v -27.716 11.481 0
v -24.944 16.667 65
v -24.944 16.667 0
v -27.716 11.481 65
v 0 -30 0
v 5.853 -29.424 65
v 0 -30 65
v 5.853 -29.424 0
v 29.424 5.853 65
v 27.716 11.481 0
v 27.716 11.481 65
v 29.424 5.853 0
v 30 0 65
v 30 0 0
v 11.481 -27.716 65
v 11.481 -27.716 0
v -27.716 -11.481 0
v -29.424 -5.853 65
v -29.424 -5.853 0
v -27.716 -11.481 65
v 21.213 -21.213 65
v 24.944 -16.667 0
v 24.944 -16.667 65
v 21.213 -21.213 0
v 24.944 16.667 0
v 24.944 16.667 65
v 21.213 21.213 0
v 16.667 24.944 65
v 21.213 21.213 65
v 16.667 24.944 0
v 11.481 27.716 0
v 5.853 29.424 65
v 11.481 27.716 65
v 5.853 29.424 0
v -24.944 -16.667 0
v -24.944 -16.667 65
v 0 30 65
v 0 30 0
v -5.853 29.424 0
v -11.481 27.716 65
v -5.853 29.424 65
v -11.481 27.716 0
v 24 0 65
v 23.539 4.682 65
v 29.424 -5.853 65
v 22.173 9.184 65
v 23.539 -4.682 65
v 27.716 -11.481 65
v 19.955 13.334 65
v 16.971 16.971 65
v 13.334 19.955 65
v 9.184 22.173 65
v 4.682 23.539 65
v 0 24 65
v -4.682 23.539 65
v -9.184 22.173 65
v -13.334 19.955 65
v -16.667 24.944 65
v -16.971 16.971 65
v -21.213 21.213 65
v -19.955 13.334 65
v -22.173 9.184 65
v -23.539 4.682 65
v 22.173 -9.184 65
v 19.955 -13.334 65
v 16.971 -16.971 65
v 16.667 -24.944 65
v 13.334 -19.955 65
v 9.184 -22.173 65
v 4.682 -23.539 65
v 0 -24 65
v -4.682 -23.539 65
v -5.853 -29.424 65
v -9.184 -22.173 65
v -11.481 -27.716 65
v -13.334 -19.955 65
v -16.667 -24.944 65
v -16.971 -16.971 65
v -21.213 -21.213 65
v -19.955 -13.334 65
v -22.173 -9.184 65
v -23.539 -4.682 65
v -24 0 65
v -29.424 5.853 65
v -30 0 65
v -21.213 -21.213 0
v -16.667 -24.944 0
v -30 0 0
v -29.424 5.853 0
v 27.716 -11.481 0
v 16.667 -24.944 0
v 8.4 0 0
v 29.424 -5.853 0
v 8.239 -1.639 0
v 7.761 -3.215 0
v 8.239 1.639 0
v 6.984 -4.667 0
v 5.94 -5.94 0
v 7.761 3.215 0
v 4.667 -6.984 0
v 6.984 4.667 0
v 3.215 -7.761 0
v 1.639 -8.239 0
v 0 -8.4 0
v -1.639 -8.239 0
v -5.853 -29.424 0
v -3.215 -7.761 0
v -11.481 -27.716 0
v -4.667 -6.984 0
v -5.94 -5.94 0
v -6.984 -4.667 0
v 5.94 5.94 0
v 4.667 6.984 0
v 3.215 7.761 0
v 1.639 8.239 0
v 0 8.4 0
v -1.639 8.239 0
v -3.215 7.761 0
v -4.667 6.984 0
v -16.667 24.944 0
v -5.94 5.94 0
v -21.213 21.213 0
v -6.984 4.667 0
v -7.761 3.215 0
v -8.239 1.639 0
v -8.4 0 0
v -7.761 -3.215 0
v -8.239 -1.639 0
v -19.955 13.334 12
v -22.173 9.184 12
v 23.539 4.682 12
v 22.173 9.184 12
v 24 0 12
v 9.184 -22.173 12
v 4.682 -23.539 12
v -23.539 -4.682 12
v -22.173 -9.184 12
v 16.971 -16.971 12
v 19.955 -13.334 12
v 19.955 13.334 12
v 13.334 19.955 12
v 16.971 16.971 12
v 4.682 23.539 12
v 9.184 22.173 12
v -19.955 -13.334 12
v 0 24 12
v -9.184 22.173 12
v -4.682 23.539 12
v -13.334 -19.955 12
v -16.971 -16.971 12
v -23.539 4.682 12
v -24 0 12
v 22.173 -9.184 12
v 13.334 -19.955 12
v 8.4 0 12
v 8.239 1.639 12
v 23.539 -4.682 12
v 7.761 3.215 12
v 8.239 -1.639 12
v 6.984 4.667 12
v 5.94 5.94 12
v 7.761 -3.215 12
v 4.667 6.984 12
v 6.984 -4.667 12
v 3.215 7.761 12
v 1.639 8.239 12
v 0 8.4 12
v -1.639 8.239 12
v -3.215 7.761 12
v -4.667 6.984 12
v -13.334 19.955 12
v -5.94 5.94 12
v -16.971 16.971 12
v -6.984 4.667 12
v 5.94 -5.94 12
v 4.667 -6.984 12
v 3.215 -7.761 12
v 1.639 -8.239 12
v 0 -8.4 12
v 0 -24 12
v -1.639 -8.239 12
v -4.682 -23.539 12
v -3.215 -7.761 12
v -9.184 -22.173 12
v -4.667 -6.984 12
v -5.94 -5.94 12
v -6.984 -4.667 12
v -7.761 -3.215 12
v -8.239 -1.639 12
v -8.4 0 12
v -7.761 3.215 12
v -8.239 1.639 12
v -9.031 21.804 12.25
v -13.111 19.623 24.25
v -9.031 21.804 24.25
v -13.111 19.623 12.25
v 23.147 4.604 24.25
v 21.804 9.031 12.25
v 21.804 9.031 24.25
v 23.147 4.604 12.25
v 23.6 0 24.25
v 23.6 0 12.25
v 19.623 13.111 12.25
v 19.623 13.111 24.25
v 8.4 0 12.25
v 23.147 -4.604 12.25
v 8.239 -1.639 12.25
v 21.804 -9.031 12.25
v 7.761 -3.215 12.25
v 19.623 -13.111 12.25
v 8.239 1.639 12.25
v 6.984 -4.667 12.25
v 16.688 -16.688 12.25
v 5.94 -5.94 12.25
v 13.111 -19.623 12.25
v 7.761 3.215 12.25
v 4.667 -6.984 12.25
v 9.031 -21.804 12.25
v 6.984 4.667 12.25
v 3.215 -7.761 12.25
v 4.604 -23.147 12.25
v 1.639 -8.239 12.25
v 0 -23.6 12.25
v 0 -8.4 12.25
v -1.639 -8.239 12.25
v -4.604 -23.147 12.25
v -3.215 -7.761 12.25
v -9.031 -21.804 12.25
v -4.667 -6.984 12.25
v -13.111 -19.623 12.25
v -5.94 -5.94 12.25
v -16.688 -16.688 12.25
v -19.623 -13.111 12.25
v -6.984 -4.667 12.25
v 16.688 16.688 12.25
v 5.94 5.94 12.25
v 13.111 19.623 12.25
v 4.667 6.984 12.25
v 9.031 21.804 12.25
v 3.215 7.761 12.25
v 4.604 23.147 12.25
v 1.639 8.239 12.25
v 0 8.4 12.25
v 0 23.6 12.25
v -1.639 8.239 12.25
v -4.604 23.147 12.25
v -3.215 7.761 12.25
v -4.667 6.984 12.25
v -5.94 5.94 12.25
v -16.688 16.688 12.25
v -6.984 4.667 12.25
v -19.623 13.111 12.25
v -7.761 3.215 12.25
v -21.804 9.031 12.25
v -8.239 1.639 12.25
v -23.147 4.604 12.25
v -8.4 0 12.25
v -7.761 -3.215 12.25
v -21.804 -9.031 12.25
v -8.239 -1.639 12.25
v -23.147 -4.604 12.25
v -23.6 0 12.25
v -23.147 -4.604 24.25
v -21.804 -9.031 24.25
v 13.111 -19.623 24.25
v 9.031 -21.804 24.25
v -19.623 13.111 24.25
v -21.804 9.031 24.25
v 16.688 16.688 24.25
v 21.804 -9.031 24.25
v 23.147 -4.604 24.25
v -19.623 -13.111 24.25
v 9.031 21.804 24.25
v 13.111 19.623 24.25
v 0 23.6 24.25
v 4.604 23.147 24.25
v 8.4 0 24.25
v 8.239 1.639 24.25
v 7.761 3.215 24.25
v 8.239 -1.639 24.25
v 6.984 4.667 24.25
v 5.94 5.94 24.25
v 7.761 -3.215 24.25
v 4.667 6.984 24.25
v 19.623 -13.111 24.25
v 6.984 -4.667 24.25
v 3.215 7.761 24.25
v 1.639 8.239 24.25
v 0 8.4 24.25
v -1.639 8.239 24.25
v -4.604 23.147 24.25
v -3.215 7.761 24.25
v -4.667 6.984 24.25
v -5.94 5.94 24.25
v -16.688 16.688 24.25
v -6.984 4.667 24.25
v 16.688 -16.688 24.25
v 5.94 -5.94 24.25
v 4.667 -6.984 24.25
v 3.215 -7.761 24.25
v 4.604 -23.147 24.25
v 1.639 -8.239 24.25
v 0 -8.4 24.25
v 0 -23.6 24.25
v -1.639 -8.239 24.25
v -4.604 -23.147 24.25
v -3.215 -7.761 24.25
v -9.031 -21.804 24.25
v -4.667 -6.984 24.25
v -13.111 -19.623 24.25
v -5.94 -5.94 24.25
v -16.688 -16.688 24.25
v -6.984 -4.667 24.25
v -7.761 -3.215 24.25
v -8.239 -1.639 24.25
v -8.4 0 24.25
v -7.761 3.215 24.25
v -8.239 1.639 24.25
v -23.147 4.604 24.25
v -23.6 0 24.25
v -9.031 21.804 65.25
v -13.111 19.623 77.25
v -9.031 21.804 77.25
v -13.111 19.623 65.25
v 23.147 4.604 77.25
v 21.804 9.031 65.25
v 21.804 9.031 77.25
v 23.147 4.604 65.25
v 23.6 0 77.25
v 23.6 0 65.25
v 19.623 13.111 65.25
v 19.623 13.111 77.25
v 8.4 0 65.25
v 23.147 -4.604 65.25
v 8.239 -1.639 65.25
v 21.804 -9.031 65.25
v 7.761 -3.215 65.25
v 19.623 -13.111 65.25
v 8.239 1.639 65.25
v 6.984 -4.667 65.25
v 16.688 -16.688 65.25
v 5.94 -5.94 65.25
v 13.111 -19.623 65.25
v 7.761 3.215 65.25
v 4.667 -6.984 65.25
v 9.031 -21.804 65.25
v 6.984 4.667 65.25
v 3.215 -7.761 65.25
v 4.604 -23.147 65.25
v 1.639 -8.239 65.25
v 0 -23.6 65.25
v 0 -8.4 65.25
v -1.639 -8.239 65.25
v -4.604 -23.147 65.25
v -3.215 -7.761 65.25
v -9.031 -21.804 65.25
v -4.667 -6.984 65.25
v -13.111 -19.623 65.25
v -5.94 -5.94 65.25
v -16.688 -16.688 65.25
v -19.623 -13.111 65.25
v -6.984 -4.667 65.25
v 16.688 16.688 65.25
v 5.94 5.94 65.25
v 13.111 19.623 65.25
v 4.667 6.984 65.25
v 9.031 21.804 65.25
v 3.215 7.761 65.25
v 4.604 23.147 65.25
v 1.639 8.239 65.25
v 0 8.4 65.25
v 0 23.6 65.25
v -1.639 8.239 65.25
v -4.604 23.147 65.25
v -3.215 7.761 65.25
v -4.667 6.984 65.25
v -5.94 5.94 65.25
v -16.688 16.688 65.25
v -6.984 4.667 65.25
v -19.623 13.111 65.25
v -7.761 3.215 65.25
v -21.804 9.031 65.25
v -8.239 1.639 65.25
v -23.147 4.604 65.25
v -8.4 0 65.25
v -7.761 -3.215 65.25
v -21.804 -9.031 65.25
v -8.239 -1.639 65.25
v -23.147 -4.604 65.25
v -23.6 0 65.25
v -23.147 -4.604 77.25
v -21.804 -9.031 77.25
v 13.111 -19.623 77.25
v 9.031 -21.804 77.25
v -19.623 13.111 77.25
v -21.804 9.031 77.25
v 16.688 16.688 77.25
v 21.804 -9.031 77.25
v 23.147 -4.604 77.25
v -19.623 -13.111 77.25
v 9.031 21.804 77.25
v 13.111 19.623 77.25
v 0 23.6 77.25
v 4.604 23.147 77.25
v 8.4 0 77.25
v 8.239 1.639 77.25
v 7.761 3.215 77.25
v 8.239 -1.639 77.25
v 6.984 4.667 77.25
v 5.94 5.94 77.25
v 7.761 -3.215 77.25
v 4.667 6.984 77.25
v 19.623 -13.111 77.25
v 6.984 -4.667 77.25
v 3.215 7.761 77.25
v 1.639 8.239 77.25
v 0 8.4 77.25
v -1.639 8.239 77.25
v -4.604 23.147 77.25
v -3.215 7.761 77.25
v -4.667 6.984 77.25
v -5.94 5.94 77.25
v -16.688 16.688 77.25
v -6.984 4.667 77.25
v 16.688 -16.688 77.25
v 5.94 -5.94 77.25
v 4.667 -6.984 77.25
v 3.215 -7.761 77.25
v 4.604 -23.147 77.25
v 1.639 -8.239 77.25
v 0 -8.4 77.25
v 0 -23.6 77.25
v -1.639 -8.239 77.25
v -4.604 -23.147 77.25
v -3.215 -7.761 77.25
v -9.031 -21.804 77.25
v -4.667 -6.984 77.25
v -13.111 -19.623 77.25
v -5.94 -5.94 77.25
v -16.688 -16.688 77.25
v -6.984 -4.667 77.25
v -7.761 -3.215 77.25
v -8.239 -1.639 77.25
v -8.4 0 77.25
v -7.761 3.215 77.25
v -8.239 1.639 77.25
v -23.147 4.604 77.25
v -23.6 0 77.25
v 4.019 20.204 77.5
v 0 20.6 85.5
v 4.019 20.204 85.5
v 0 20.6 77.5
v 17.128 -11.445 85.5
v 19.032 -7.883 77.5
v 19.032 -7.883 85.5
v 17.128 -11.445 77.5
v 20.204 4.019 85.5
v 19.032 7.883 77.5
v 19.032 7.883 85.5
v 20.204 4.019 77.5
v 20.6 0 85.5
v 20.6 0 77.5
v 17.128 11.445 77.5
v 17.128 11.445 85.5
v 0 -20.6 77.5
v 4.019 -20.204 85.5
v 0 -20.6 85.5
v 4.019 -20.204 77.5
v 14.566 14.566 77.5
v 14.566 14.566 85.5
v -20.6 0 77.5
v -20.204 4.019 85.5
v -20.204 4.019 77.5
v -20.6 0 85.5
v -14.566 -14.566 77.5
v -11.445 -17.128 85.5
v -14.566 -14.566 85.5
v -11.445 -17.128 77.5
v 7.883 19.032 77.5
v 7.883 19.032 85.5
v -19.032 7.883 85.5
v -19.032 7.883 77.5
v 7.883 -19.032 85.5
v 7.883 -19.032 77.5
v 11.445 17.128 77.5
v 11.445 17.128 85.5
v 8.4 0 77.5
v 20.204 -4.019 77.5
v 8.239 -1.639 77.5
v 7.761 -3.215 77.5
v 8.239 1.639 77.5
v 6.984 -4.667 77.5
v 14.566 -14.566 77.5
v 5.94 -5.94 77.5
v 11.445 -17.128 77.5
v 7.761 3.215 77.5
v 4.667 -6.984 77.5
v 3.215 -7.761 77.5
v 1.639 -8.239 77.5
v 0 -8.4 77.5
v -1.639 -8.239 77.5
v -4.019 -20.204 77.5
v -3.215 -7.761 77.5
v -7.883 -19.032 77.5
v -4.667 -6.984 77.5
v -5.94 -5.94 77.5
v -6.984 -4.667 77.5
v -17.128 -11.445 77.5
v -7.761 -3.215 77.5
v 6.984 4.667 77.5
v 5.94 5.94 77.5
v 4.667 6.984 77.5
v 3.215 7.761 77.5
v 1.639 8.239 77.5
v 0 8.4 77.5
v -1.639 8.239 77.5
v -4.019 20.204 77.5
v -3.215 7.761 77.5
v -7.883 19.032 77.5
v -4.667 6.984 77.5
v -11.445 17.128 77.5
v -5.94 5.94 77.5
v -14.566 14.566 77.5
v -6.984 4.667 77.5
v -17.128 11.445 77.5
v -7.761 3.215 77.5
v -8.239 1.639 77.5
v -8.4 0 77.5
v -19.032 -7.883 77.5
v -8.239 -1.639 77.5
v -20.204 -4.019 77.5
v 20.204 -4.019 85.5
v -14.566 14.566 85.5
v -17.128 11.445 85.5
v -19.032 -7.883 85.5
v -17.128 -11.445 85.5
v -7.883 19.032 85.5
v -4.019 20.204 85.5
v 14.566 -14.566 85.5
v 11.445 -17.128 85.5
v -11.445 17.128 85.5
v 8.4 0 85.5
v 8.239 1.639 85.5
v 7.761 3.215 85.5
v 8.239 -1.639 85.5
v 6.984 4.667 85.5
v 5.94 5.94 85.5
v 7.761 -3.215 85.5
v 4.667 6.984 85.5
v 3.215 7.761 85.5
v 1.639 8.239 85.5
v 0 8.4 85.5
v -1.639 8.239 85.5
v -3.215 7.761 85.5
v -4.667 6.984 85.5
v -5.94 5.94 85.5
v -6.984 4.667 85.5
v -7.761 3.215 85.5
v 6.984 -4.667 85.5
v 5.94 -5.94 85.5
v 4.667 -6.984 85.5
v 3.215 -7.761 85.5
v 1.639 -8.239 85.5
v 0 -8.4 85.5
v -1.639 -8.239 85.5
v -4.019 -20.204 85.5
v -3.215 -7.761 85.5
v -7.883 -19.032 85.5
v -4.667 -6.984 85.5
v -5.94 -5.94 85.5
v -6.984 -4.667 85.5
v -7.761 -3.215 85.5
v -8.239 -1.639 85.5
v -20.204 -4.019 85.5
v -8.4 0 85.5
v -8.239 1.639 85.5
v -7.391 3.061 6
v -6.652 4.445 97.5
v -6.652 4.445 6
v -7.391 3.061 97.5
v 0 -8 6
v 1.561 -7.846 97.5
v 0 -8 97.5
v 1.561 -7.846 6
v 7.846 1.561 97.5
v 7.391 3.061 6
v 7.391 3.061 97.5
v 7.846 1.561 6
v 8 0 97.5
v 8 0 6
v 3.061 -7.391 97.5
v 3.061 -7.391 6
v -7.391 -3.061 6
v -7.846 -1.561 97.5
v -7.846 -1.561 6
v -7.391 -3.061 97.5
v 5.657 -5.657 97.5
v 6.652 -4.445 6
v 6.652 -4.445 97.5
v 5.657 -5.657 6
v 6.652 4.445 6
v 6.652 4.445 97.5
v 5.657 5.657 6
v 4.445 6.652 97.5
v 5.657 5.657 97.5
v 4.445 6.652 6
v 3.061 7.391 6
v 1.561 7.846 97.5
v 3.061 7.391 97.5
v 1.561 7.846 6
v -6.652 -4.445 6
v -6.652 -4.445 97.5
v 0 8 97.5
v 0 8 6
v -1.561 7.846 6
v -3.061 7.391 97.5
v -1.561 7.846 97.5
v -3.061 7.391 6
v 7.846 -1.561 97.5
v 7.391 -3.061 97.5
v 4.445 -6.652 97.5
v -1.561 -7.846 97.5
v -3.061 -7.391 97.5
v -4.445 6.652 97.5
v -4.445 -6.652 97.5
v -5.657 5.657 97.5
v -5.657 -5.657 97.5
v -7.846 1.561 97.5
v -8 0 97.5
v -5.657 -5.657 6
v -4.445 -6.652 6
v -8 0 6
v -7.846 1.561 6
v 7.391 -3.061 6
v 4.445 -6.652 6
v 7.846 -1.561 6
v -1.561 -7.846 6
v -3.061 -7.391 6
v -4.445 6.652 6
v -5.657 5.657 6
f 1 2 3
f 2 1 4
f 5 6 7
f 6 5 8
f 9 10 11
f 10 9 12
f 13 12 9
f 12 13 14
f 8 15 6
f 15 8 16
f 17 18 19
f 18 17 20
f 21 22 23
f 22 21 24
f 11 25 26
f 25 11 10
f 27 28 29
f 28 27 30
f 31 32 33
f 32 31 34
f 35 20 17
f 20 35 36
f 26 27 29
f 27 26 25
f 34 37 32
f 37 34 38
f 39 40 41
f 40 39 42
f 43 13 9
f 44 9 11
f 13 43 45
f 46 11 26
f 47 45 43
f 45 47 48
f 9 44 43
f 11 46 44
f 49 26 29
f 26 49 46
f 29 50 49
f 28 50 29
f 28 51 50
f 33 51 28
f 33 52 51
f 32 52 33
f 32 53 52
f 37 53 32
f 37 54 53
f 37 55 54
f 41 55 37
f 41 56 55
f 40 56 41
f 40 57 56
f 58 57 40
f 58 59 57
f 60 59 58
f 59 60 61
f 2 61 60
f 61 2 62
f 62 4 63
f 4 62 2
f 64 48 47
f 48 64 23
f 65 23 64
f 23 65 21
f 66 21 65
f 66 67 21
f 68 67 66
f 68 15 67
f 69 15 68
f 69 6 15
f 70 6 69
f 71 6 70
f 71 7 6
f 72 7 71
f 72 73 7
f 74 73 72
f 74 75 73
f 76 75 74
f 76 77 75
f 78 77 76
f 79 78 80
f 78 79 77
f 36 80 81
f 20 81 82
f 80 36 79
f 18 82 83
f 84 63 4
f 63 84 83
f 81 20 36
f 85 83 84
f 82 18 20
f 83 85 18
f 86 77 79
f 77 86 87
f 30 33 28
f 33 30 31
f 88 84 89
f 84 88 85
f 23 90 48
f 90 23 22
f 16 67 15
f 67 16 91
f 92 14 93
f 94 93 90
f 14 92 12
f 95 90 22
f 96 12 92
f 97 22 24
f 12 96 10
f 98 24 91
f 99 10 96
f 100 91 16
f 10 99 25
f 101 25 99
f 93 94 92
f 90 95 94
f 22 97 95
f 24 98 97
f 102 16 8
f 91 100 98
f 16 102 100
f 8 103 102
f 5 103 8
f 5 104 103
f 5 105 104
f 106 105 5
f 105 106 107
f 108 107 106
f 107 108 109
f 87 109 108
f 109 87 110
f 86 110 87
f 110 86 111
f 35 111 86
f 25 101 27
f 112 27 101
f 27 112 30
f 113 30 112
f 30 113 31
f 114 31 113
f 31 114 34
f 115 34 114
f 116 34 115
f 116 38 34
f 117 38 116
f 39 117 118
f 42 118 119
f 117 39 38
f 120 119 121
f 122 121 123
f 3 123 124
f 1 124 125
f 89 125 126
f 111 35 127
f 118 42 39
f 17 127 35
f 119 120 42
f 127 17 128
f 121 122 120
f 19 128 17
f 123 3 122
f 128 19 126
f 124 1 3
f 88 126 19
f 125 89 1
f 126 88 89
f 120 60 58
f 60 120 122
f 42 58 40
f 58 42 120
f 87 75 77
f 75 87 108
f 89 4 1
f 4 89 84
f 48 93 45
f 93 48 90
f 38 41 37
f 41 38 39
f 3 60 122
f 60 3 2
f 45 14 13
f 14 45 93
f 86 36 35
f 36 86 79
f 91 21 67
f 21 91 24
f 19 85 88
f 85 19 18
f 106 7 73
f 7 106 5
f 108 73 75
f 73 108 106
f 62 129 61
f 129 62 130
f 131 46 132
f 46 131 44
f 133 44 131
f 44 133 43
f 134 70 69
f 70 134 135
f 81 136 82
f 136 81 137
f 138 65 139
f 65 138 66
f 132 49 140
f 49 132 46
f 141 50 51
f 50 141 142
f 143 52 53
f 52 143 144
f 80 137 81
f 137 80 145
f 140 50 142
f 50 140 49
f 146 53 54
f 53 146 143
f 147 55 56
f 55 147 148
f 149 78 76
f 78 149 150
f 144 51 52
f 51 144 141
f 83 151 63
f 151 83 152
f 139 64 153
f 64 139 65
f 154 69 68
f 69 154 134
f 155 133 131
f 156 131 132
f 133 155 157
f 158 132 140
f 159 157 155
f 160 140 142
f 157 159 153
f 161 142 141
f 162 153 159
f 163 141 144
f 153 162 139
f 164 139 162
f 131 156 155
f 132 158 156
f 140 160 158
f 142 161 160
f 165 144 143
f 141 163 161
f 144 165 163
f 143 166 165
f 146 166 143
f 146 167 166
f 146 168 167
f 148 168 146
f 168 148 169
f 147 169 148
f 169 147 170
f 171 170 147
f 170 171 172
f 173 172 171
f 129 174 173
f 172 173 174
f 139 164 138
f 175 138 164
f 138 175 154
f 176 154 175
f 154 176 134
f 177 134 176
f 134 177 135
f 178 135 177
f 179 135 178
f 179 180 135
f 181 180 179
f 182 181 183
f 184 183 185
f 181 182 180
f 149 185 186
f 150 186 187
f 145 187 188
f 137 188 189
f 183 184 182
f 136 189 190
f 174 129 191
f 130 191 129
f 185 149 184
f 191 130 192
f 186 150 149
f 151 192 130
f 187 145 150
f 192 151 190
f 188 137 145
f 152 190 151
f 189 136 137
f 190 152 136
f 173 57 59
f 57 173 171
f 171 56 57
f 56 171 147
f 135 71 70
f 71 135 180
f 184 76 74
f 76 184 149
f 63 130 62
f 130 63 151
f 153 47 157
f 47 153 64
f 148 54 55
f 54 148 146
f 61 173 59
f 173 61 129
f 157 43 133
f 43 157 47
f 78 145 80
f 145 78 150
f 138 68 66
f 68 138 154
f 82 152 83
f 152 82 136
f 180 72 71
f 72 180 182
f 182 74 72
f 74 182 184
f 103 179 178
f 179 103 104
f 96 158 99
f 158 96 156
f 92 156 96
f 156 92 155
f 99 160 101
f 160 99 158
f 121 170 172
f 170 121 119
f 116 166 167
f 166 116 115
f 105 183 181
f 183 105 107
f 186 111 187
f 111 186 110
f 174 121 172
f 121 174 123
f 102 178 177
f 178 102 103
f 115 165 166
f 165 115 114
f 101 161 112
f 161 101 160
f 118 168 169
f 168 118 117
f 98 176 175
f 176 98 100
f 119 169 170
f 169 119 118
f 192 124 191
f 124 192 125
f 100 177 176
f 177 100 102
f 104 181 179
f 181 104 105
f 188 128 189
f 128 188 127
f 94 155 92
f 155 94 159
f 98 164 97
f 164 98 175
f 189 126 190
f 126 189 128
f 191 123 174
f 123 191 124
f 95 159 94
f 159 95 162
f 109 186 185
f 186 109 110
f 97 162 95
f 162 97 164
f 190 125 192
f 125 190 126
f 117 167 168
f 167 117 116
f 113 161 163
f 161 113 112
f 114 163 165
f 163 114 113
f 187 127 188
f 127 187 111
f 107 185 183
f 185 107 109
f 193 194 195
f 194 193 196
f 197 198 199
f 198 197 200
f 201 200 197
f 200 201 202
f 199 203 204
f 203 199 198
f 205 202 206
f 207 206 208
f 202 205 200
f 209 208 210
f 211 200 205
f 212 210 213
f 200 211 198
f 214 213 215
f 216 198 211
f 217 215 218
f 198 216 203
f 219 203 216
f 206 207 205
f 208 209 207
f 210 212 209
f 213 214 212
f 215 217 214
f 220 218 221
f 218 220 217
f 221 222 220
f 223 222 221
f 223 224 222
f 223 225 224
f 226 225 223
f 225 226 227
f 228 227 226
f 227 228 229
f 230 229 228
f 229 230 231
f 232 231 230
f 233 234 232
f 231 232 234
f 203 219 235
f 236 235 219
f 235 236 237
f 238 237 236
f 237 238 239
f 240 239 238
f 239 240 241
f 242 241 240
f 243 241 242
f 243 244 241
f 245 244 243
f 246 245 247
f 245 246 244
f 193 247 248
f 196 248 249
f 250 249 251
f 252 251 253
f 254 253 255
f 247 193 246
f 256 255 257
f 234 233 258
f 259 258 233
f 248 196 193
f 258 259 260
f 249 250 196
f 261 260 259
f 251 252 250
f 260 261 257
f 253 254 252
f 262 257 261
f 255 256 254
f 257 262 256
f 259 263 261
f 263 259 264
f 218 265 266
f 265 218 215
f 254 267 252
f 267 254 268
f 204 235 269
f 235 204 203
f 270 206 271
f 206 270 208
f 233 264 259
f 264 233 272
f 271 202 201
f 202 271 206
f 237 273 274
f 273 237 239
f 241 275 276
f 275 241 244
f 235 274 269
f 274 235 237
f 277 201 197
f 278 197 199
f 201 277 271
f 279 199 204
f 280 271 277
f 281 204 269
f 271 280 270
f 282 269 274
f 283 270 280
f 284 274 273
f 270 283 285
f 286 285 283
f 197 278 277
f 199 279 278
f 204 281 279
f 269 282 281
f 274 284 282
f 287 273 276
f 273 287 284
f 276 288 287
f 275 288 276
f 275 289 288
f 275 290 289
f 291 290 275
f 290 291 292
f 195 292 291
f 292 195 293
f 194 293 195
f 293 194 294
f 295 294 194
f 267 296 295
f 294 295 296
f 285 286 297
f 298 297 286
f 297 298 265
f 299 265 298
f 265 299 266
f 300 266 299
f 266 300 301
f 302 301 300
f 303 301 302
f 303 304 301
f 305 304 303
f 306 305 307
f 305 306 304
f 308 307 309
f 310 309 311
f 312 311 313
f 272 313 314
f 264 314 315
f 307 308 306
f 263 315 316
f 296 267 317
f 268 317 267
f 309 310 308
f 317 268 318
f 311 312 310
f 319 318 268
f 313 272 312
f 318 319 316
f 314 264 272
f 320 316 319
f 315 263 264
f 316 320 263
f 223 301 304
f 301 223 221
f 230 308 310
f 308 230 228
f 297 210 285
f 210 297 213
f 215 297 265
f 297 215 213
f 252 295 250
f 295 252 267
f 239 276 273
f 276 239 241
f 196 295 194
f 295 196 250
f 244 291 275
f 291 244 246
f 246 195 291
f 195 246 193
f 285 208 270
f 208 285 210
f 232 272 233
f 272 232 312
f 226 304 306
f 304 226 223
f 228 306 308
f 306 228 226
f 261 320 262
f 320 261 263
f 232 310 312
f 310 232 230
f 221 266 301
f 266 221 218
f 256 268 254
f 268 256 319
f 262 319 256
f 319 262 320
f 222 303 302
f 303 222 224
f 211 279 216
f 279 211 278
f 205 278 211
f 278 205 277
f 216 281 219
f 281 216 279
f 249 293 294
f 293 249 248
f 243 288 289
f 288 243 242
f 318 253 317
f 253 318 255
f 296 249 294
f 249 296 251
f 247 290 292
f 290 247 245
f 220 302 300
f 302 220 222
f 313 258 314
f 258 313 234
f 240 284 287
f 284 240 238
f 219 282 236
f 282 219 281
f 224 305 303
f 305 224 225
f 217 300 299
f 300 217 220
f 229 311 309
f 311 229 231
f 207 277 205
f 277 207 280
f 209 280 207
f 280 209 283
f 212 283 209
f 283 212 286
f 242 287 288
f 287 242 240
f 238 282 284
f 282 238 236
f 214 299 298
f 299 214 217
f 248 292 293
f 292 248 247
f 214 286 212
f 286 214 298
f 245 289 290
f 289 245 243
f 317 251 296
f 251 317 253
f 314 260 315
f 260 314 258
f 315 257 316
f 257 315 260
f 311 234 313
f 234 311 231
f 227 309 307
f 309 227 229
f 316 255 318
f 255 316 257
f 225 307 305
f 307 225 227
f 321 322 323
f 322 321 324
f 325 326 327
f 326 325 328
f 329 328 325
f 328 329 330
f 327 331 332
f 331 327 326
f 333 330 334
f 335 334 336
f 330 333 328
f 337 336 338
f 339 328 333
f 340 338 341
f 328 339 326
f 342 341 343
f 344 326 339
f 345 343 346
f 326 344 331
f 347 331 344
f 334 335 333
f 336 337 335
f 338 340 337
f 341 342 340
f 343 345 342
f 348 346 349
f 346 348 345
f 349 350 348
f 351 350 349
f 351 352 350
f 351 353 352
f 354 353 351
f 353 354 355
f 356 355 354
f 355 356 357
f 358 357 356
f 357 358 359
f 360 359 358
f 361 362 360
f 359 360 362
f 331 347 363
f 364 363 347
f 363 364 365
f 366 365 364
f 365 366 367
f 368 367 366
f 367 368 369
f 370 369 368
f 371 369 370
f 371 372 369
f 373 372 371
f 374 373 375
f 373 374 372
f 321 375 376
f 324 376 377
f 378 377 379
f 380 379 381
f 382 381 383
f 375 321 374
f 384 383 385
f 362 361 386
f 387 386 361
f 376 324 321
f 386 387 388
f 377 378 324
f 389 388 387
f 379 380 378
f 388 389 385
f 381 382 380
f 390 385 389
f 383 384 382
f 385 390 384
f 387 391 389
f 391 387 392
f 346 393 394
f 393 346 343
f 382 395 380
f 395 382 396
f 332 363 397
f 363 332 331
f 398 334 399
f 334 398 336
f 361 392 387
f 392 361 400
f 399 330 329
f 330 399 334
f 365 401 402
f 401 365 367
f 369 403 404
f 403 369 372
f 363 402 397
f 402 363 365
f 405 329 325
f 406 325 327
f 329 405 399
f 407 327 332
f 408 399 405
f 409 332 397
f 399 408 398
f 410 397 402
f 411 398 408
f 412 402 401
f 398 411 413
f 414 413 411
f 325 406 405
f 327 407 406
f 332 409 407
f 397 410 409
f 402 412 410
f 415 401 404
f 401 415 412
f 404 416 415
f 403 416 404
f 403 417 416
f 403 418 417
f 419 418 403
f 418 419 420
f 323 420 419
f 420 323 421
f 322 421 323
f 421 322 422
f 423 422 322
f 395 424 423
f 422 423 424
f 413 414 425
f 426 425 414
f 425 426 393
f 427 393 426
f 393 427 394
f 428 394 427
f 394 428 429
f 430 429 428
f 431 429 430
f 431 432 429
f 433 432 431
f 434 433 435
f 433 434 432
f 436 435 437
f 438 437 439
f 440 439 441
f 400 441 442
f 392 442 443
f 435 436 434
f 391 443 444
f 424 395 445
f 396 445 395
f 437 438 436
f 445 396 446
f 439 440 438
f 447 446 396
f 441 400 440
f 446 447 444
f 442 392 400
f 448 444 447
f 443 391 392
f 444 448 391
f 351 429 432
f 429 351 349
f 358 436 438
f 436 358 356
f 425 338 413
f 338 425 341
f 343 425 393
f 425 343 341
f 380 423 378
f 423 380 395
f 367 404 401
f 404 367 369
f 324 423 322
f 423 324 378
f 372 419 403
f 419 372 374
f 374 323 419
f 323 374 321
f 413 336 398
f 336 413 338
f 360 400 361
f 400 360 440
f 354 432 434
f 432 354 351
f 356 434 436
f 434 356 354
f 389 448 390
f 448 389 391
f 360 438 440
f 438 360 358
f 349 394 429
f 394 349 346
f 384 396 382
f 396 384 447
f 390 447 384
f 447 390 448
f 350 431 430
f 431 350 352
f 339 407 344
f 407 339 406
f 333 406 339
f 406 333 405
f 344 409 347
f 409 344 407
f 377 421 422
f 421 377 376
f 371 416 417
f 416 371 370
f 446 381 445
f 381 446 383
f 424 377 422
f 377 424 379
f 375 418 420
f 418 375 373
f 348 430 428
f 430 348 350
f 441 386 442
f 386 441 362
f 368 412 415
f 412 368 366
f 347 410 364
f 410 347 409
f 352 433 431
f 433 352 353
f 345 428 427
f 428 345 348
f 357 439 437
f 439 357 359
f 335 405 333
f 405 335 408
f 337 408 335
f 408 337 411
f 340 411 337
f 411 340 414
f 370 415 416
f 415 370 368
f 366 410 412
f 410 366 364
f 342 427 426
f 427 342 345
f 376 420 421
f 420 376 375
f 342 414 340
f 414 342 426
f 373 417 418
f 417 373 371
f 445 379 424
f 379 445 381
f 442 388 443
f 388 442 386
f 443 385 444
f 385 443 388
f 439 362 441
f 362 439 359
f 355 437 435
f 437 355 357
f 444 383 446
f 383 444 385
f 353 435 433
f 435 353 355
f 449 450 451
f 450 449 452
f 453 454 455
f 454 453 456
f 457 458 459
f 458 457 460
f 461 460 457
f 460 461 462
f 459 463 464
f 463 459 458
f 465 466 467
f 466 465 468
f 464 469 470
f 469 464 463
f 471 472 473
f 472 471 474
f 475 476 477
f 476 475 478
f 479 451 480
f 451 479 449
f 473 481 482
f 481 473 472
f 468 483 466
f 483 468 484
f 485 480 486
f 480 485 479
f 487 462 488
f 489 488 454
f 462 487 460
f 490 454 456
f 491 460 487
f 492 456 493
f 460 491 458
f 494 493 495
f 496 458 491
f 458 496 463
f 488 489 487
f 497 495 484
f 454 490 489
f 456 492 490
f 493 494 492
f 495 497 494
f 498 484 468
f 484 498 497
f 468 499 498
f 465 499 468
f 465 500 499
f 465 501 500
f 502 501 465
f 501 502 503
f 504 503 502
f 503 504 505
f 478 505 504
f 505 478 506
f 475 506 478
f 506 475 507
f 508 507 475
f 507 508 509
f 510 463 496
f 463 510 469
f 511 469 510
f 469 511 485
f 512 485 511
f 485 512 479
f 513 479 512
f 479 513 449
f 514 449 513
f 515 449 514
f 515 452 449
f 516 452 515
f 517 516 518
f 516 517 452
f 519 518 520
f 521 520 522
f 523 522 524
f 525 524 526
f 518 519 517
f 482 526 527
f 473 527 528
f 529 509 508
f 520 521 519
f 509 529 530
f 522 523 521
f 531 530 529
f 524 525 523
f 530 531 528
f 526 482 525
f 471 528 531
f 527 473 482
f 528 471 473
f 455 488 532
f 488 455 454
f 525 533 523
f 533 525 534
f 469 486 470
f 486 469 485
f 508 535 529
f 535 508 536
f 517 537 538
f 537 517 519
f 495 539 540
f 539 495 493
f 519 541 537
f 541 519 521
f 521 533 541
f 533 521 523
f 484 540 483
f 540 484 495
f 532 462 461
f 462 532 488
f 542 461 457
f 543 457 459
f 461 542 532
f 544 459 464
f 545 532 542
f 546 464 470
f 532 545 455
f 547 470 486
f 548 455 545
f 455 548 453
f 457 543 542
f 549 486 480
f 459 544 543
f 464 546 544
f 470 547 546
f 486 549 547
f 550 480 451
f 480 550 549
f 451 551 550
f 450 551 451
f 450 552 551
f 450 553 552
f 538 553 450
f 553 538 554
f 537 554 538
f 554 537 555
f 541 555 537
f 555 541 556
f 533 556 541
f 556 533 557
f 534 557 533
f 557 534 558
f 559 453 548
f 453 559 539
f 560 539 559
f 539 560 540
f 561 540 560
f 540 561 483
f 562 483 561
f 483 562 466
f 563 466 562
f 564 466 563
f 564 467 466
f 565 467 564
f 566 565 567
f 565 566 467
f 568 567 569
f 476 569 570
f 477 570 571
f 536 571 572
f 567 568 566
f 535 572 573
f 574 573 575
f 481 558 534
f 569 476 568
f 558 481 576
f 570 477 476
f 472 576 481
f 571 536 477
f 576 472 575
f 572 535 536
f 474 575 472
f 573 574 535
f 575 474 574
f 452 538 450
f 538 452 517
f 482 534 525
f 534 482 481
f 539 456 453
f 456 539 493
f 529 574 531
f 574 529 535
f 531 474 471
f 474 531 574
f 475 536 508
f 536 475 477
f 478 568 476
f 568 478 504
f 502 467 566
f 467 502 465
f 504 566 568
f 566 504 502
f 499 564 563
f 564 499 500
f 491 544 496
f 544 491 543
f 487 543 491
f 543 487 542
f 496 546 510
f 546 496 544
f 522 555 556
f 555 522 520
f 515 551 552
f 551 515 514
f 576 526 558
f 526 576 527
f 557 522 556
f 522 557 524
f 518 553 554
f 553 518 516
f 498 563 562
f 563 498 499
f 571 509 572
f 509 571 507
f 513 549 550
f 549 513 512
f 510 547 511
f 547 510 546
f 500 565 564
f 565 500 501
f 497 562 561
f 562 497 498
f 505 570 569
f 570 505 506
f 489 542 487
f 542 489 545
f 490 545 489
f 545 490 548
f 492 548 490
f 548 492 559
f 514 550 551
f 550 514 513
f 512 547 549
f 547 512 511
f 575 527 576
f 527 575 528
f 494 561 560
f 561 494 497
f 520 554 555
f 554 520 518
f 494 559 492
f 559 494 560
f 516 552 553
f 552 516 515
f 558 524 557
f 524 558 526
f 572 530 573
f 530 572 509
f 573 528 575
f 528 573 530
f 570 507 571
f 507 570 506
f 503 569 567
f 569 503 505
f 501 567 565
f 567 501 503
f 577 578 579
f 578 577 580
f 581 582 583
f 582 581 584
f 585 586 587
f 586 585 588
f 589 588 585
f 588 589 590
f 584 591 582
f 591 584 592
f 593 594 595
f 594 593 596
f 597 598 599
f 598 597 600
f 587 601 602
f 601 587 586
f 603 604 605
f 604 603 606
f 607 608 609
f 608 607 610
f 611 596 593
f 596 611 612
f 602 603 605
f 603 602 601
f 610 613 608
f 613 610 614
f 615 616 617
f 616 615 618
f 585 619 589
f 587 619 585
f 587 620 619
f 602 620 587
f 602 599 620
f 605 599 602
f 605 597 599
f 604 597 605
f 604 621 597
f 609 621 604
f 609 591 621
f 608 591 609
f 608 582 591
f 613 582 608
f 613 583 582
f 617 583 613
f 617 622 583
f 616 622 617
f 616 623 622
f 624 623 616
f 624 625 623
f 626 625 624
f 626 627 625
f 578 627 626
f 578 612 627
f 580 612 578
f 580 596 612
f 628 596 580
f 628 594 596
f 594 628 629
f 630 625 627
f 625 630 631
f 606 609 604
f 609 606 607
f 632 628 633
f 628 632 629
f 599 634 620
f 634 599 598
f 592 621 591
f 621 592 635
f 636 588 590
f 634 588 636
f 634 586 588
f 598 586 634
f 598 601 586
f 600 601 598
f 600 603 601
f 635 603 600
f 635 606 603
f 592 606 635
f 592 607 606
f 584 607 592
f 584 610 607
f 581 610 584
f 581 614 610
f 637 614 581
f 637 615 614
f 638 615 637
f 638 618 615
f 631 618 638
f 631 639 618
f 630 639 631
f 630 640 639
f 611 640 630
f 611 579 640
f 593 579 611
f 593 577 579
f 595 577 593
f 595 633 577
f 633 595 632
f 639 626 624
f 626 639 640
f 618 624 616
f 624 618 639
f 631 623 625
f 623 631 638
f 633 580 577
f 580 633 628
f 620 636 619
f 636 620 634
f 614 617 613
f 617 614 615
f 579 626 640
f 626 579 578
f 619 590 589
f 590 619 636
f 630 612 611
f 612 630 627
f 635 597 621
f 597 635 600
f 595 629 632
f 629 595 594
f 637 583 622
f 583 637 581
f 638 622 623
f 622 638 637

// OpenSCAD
$fn = 32;

// ------------------------------------------------------------------------
// Bearing housing: housing d60, two bearings and a shaft
// Every part is its own module, assembly() places them once.
// ------------------------------------------------------------------------

// --- part 1 ---
module housing() {
  difference() {
    cylinder(h = 65, d = 60);
    translate([0, 0, 12]) cylinder(h = 54, d = 48);
    translate([0, 0, -1]) cylinder(h = 14, d = 16.8);
  }
}

// --- part 2 ---
module bearing_lower() {
  difference() {
      translate([0, 0, 0]) cylinder(h = 12, d = 47.2);
      translate([0, 0, -1]) cylinder(h = 14, d = 16.8);
    }
}

// --- part 3 ---
module bearing_upper() {
  difference() {
      translate([0, 0, 0]) cylinder(h = 12, d = 47.2);
      translate([0, 0, -1]) cylinder(h = 14, d = 16.8);
    }
}

// --- part 4 ---
module spacer() {
  difference() {
      translate([0, 0, 0]) cylinder(h = 8, d = 41.2);
      translate([0, 0, -1]) cylinder(h = 10, d = 16.8);
    }
}

// --- part 5 ---
module shaft() {
  translate([0, 0, -45.75]) cylinder(h = 91.5, d = 16);
}

// --- assembly ---
module assembly() {
  translate([0, 0, 0]) rotate([0, 0, 0]) housing();
  translate([0, 0, 12.25]) rotate([0, 0, 0]) bearing_lower();
  translate([0, 0, 65.25]) rotate([0, 0, 0]) bearing_upper();
  translate([0, 0, 77.5]) rotate([0, 0, 0]) spacer();
  translate([0, 0, 51.75]) rotate([0, 0, 0]) shaft();
}

assembly();
